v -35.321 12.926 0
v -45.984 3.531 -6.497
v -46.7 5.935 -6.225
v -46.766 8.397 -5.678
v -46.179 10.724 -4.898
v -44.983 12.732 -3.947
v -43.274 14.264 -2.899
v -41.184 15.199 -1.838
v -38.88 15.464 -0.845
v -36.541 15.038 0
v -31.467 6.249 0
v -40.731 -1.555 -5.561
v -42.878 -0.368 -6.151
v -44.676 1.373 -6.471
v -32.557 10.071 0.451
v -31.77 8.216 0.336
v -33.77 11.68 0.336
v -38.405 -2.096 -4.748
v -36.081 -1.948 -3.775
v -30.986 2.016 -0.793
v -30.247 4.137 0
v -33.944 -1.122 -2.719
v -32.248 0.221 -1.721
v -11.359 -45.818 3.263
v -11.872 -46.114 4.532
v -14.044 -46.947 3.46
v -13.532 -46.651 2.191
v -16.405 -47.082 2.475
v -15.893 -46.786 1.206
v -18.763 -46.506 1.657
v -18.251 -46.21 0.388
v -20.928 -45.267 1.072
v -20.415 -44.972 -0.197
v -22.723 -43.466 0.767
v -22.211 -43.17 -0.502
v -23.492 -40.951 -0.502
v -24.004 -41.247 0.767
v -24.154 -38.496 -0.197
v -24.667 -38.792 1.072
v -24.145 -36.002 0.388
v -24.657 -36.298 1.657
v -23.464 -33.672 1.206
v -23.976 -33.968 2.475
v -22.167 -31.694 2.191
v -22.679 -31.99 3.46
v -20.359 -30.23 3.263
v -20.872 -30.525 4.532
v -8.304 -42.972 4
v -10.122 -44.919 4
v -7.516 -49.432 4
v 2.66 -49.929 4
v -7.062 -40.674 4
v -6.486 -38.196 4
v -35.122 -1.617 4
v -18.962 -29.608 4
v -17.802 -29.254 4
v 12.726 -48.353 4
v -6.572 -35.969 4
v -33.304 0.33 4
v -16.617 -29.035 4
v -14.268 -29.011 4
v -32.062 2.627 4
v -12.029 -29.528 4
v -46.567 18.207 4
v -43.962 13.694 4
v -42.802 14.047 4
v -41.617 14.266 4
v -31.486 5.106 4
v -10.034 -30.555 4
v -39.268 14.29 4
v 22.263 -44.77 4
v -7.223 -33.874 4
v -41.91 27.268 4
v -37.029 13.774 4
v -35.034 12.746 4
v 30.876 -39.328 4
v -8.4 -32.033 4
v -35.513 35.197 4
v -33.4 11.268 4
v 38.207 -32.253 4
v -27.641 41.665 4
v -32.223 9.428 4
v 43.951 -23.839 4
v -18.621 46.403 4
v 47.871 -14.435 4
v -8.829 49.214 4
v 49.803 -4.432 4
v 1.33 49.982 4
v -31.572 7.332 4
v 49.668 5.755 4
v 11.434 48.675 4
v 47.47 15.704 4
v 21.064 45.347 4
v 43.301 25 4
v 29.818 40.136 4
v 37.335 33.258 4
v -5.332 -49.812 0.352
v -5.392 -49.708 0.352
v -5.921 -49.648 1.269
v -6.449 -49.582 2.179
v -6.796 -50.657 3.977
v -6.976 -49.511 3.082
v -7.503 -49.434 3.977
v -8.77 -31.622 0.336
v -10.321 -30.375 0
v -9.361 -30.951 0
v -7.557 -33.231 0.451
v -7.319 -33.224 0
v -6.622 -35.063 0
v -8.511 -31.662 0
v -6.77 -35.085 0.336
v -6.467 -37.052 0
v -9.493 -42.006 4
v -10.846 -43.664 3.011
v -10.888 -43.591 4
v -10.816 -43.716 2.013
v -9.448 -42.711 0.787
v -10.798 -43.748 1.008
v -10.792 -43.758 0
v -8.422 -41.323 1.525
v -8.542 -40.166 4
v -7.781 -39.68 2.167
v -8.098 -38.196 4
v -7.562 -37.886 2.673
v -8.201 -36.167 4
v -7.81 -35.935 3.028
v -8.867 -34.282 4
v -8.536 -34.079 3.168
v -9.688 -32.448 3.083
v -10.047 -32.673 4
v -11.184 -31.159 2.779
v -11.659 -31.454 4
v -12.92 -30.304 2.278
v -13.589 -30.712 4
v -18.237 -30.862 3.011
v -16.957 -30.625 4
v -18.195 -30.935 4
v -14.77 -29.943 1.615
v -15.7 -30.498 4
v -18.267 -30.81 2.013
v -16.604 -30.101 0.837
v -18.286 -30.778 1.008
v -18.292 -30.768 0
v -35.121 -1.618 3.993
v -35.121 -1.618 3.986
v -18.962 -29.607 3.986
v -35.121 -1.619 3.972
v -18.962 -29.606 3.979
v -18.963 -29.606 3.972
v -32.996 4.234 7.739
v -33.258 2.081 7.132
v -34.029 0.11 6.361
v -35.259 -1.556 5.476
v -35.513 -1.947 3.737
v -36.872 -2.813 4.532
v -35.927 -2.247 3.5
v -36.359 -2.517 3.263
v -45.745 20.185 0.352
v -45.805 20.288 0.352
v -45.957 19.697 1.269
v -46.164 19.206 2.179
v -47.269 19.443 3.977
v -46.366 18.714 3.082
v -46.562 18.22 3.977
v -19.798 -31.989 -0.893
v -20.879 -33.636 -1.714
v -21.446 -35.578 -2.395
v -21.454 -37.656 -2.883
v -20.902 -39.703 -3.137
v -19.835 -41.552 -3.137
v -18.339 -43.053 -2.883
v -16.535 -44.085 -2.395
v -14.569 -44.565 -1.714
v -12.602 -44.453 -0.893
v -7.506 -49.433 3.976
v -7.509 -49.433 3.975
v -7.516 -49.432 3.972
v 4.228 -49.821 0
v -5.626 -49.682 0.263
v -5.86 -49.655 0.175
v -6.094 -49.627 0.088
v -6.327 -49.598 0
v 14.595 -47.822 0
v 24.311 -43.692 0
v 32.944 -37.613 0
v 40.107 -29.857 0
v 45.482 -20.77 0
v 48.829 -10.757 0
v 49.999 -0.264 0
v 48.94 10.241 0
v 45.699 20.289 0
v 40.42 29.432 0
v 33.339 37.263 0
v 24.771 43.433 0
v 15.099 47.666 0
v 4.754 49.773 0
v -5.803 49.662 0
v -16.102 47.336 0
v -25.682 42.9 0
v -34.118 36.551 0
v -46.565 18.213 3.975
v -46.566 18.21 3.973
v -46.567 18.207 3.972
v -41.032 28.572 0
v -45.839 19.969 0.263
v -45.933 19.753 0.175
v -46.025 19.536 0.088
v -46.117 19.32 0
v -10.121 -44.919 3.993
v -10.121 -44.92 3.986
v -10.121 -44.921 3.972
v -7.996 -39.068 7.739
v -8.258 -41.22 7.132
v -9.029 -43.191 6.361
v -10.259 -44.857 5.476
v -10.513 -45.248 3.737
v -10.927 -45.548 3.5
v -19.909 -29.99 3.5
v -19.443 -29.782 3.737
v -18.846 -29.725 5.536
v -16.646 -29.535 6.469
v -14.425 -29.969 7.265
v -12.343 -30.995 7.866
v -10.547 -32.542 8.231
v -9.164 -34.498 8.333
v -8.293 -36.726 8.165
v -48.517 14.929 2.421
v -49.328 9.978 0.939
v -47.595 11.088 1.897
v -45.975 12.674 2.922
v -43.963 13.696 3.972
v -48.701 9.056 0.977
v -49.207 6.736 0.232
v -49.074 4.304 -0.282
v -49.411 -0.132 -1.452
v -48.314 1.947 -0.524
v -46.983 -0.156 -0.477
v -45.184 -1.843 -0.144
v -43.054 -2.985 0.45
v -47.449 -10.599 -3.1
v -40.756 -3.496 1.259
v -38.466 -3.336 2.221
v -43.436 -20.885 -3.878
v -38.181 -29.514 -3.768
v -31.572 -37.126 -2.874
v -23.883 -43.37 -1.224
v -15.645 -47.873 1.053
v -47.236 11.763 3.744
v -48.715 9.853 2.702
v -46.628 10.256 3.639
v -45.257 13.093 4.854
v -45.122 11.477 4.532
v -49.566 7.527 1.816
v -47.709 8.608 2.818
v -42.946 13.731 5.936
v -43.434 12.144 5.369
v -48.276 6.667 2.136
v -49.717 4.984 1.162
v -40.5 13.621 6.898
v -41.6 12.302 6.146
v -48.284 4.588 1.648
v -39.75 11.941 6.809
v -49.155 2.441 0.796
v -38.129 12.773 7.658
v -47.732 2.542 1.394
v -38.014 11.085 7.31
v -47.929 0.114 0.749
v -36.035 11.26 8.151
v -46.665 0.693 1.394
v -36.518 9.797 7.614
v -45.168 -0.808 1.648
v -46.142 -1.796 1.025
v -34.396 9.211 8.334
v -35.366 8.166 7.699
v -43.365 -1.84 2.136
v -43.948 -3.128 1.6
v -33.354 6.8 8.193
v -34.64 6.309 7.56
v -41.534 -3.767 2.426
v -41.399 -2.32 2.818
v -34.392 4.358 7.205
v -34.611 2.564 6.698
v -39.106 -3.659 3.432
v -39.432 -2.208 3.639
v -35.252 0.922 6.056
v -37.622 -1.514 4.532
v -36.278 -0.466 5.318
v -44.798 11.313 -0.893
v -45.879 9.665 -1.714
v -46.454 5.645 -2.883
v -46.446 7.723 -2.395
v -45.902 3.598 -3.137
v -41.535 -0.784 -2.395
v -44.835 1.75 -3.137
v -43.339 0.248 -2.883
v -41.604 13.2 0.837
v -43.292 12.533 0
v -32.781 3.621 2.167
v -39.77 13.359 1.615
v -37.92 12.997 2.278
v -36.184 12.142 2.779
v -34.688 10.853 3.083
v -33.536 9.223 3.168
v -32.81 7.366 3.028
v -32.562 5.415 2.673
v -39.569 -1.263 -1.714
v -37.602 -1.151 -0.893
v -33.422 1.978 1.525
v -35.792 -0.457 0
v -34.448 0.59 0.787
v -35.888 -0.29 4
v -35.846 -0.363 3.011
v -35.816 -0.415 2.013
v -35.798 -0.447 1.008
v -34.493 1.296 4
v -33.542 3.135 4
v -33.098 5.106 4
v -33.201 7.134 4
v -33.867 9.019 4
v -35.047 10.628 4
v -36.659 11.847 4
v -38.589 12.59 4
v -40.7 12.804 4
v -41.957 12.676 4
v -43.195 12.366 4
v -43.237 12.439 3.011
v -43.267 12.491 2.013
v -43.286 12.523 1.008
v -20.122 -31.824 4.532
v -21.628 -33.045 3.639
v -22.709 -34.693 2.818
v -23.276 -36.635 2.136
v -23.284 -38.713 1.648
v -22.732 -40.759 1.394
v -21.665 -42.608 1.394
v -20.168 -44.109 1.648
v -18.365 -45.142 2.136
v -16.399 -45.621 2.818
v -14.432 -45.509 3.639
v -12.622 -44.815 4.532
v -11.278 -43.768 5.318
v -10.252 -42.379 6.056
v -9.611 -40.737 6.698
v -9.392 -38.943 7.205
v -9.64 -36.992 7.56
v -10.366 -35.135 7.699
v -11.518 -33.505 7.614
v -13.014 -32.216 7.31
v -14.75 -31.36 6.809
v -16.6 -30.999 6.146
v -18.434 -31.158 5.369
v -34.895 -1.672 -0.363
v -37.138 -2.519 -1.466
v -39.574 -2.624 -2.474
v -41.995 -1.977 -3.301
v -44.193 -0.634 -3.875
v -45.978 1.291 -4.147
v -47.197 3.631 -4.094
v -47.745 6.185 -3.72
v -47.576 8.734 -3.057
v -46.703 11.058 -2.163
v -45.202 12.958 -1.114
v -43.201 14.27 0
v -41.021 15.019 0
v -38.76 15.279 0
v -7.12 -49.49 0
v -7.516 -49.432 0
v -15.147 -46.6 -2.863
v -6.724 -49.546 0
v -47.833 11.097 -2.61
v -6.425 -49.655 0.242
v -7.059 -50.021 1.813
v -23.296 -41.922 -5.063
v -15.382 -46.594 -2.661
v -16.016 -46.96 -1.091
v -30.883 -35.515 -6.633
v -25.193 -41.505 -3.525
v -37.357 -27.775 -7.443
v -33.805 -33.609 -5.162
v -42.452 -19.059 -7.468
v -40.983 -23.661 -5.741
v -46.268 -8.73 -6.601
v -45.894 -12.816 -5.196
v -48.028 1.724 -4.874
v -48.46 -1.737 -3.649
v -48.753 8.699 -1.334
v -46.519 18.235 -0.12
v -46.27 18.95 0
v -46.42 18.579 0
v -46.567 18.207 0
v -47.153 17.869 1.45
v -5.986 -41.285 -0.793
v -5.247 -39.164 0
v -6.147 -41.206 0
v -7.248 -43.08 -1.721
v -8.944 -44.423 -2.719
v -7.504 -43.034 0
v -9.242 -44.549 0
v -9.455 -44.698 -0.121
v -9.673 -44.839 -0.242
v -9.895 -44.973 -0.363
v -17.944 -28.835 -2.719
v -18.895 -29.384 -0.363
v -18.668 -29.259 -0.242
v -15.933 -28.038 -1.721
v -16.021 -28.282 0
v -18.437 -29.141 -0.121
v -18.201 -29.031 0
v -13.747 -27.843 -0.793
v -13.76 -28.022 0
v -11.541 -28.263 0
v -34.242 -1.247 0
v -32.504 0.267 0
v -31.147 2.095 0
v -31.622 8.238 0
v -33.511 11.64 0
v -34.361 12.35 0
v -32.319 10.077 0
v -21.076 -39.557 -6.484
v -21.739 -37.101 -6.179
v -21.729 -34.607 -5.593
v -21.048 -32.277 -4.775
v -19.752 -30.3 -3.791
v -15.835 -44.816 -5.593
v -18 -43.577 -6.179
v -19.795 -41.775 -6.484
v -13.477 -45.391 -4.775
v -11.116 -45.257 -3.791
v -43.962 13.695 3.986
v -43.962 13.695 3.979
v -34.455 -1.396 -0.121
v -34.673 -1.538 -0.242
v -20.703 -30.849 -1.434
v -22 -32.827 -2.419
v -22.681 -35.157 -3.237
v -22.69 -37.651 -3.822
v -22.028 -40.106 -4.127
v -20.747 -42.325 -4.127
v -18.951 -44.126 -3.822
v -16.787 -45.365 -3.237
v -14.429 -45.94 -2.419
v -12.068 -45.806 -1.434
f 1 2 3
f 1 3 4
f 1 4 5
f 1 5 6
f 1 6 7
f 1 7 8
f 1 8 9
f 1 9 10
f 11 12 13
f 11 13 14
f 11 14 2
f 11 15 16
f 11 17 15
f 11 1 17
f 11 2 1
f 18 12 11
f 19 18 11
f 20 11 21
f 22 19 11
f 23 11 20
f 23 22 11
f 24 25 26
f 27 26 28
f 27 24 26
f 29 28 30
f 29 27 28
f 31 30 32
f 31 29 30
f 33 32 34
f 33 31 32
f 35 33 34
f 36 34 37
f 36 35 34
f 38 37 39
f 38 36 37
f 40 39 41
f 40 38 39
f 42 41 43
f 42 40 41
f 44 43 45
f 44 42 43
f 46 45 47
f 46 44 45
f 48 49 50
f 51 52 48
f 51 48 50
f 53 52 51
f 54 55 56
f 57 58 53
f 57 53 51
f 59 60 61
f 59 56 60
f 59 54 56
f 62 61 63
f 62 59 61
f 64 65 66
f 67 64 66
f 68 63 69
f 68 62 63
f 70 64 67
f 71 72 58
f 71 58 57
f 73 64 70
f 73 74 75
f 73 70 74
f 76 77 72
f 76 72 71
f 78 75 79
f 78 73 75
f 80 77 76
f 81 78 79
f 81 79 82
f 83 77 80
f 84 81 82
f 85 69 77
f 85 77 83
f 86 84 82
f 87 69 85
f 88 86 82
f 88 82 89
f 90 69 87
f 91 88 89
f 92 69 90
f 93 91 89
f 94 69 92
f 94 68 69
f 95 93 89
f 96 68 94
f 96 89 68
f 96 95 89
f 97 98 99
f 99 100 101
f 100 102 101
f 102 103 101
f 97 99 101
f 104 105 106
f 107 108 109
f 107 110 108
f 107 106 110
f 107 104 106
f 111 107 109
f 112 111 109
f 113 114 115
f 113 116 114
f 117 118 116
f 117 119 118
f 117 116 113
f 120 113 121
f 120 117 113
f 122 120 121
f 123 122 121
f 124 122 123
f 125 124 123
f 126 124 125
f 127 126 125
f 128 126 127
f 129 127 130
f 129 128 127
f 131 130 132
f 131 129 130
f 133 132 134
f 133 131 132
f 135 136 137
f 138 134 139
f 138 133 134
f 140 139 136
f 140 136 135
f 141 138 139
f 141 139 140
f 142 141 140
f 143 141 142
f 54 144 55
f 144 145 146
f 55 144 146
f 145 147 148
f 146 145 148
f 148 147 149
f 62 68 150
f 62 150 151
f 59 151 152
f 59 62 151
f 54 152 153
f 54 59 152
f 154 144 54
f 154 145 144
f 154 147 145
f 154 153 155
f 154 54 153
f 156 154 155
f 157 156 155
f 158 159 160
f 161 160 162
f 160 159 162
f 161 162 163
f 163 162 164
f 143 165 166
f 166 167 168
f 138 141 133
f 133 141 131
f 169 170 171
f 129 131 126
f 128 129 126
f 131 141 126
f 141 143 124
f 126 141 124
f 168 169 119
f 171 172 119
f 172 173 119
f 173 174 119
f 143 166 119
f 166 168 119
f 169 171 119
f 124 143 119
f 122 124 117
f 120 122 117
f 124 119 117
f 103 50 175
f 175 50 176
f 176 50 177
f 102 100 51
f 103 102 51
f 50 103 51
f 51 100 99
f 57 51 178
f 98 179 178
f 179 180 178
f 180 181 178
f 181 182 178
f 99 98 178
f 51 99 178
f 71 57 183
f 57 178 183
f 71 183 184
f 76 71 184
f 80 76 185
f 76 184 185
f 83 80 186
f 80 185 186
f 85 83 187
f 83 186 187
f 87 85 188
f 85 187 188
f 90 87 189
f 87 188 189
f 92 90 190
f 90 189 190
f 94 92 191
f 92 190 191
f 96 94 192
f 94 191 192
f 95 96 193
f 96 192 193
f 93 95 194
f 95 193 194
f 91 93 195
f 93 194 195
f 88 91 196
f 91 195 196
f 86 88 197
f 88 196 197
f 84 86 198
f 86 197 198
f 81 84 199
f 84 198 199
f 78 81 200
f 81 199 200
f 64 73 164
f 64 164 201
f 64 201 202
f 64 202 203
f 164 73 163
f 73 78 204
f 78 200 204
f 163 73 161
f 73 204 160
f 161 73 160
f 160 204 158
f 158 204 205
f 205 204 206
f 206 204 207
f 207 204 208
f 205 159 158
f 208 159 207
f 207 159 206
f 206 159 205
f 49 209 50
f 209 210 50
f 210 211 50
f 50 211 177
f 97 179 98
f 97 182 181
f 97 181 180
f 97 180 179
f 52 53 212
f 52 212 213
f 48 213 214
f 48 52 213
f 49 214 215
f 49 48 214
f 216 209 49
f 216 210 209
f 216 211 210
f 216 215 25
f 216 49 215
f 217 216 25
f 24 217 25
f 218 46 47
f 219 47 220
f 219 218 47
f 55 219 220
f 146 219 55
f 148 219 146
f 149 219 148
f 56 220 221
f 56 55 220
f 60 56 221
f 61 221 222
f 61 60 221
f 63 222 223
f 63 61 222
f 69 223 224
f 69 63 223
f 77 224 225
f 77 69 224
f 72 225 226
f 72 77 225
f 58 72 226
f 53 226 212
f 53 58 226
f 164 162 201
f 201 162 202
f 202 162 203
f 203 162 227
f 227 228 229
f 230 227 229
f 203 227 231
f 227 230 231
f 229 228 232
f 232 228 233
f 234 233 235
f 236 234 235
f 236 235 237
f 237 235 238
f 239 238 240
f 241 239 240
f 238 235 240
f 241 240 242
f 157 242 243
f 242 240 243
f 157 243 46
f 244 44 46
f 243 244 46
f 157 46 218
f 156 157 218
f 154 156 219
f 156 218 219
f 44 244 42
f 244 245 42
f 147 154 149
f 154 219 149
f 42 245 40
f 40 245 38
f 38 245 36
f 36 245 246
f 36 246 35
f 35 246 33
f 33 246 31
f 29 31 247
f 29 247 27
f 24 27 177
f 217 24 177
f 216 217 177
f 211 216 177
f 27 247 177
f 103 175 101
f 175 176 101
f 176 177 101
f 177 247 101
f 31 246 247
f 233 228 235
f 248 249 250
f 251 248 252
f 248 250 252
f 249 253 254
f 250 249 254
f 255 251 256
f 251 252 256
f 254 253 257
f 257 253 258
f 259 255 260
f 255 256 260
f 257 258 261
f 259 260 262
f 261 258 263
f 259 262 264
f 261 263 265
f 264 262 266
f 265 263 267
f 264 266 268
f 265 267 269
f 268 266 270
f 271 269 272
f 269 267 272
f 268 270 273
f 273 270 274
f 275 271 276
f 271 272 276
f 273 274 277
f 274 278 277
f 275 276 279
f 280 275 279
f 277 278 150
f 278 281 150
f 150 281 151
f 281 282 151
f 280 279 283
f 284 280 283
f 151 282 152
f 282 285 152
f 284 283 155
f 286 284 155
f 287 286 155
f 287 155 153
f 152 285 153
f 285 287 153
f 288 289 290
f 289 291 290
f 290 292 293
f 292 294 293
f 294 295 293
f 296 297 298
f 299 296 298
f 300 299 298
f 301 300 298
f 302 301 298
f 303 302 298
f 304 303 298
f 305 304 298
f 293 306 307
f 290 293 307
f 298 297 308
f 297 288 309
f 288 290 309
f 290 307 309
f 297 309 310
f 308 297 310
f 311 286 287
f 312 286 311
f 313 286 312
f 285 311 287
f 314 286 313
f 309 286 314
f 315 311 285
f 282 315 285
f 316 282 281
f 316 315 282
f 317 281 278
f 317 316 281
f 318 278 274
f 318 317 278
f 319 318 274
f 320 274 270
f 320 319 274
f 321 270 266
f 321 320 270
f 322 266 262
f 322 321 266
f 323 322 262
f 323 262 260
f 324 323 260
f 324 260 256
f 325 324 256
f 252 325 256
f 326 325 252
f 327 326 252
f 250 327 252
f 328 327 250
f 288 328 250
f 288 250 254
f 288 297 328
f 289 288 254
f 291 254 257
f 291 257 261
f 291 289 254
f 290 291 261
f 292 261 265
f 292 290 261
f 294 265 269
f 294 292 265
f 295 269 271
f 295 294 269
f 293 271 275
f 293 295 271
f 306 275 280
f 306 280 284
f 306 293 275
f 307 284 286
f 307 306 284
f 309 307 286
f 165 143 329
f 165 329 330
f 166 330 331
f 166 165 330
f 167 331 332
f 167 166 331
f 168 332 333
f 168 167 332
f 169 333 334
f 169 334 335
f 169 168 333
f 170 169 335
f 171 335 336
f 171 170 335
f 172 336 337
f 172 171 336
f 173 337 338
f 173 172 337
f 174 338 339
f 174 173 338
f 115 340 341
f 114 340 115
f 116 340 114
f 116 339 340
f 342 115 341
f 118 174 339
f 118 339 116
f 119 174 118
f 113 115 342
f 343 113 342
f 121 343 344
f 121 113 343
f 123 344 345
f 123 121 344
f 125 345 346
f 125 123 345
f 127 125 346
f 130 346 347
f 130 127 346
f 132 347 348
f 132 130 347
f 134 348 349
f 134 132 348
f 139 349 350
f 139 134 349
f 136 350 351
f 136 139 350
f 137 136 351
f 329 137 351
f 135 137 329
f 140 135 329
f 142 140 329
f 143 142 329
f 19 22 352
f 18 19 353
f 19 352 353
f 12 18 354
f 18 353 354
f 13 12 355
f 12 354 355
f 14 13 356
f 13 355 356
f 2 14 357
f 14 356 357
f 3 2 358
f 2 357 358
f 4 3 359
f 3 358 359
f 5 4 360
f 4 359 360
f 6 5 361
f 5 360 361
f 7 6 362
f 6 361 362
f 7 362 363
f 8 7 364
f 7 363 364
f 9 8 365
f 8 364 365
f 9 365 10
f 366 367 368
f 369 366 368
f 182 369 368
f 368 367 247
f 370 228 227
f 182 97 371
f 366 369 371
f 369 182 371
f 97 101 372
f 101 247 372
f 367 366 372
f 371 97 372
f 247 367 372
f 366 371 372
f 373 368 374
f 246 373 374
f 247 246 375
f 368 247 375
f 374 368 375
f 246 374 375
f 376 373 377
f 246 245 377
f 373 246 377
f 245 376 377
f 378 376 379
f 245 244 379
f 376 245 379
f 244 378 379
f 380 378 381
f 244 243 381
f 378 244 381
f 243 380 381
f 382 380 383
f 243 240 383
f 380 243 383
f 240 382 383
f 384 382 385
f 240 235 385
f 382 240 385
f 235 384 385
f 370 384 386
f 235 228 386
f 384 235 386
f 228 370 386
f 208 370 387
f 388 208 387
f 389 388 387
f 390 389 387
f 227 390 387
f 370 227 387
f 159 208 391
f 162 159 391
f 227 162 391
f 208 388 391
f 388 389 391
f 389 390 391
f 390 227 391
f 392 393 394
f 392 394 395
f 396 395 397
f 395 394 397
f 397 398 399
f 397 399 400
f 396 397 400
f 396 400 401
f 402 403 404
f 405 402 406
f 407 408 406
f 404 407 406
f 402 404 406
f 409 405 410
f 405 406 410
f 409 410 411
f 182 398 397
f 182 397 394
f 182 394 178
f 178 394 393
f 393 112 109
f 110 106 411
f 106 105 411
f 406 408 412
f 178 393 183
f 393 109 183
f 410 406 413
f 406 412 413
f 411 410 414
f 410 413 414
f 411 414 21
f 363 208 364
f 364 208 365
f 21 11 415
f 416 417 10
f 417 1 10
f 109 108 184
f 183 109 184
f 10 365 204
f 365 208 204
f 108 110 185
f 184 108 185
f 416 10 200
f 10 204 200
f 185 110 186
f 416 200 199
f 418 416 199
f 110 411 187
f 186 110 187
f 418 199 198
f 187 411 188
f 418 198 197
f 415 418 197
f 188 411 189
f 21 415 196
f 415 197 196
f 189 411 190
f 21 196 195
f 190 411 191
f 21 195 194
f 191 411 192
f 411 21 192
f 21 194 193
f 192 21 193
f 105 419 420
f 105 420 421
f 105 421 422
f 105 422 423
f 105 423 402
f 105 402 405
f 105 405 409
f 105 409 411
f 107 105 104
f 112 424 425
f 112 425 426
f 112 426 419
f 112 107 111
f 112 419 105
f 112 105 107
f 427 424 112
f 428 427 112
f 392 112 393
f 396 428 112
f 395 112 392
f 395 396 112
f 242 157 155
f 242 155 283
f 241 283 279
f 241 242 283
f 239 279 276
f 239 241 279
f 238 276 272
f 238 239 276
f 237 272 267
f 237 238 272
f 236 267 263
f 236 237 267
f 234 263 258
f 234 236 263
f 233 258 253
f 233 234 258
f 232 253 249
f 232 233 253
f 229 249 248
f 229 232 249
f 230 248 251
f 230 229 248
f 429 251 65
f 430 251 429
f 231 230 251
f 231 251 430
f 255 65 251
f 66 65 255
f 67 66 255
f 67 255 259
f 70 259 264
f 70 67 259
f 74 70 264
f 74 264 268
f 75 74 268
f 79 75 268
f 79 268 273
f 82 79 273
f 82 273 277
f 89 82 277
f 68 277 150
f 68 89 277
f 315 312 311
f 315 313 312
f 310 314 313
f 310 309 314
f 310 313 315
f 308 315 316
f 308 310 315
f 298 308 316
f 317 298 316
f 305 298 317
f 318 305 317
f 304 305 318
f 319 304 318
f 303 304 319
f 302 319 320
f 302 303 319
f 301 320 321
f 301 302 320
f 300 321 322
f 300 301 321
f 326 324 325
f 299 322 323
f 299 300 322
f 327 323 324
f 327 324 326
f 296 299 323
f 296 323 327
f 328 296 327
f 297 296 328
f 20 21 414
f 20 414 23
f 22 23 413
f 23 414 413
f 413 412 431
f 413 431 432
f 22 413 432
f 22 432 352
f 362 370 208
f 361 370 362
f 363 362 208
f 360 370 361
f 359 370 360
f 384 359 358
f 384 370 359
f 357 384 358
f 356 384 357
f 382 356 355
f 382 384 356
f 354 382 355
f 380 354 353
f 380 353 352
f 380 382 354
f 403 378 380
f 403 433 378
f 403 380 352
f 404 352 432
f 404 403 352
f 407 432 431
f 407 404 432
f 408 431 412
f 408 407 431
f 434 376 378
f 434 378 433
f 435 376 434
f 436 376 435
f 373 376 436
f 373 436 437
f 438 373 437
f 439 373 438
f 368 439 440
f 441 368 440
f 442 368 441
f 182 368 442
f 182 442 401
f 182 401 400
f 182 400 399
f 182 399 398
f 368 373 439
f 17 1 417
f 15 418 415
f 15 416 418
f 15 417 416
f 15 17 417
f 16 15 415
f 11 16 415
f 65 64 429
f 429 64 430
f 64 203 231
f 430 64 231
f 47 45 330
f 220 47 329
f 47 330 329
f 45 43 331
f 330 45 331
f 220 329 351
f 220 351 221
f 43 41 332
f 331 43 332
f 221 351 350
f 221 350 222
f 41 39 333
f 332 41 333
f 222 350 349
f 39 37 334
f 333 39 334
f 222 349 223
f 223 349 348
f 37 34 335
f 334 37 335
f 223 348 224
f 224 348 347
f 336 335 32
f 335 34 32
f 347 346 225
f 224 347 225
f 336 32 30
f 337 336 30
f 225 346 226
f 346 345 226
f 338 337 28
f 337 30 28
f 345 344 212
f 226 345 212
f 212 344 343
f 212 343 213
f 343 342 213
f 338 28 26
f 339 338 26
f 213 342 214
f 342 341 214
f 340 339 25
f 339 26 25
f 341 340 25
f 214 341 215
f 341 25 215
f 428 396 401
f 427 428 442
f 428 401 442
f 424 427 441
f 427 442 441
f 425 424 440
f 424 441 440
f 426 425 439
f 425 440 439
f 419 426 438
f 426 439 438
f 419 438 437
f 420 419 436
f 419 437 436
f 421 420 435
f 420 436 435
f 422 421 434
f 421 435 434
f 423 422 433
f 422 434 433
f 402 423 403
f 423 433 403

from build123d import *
from build123d import SkipClean  # not in build123d's __all__

# Parameters (mm, degrees)
F2_DEPTH      = 4
F4_DEPTH      = 5
F5_DEPTH      = 45.5098150694
F5_DEPTH_BACK = 23.1317451549
F6_DEPTH      = 3
F9_DEPTH      = 4


with BuildPart() as f2:
    # F0 (on Top) → F2 (new body)
    with BuildSketch(Plane.XY):
        with BuildLine():
            Line((27.041634566, -15.612494996), (39.541634566, 6.0381400986))
            ThreePointArc((39.541634566, 6.0381400986), (34.6410161514, 20), (25, 31.224989992))
            Line((25, 31.224989992), (0, 31.224989992))
            Line((0, 31.224989992), (0, 0))
            Line((0, 0), (27.041634566, -15.612494996))
        make_face()
        with BuildLine():
            ThreePointArc((-14.541634566, -37.2631300906), (0, -40), (14.541634566, -37.2631300906))
            Line((14.541634566, -37.2631300906), (27.041634566, -15.612494996))
            Line((27.041634566, -15.612494996), (0, 0))
            Line((0, 0), (-27.041634566, -15.612494996))
            Line((-27.041634566, -15.612494996), (-14.541634566, -37.2631300906))
        make_face()
        with BuildLine():
            Line((0, 31.224989992), (-25, 31.224989992))
            ThreePointArc((-25, 31.224989992), (-34.6410161514, 20), (-39.541634566, 6.0381400986))
            Line((-39.541634566, 6.0381400986), (-27.041634566, -15.612494996))
            Line((-27.041634566, -15.612494996), (0, 0))
            Line((0, 0), (0, 31.224989992))
        make_face()
        with BuildLine():
            ThreePointArc((14.541634566, -37.2631300906), (33.0277563773, -22.5647359541), (40, 0))
            ThreePointArc((40, 0), (39.8852440298, 3.0277563773), (39.541634566, 6.0381400986))
            Line((39.541634566, 6.0381400986), (27.041634566, -15.612494996))
            Line((27.041634566, -15.612494996), (14.541634566, -37.2631300906))
        make_face()
        with BuildLine():
            Line((0, 31.224989992), (25, 31.224989992))
            ThreePointArc((25, 31.224989992), (0, 40), (-25, 31.224989992))
            Line((-25, 31.224989992), (0, 31.224989992))
        make_face()
        with BuildLine():
            ThreePointArc((39.541634566, 6.0381400986), (39.8852440298, 3.0277563773), (40, 0))
            ThreePointArc((40, 0), (33.0277563773, -22.5647359541), (14.541634566, -37.2631300906))
            ThreePointArc((14.541634566, -37.2631300906), (0, -40), (-14.541634566, -37.2631300906))
            Line((-14.541634566, -37.2631300906), (-7.5160103762, -49.4318681422))
            ThreePointArc((-7.5160103762, -49.4318681422), (32.5898717487, -37.9196553176), (50, 0))
            ThreePointArc((50, 0), (9.2638291816, 49.1343206821), (-46.5672587557, 18.2068781502))
            Line((-46.5672587557, 18.2068781502), (-39.541634566, 6.0381400986))
            ThreePointArc((-39.541634566, 6.0381400986), (-34.6410161514, 20), (-25, 31.224989992))
            ThreePointArc((-25, 31.224989992), (0, 40), (25, 31.224989992))
            ThreePointArc((25, 31.224989992), (34.6410161514, 20), (39.541634566, 6.0381400986))
        make_face()
    extrude(amount=F2_DEPTH)

    # F3 (on line) → F4 (join)
    with BuildSketch(Plane(origin=(-4.8298034606, -2.7884883281, 11.9598650349), x_dir=(0.9306155778, -0.0831049393, 0.3564382351), z_dir=(0.3659981508, 0.2113091309, -0.906307787))):
        with BuildLine():
            ThreePointArc((-41.3294511967, -12.2059585244), (-43.6253957362, -1.8508323218), (-33.2702695336, 0.4451122176))
            Line((-33.2702695336, 0.4451122176), (-32.4643513672, 1.7102192918))
            ThreePointArc((-32.4643513672, 1.7102192918), (-44.8905028104, -1.0449141555), (-42.135369363, -13.4710655987))
            Line((-42.135369363, -13.4710655986), (-41.3294511967, -12.2059585244))
        make_face()
        with BuildLine():
            Line((-32.4643513672, 1.7102192918), (-33.2702695336, 0.4451122176))
            ThreePointArc((-33.2702695336, 0.4451122176), (-30.724454247, -2.2729261844), (-29.7998603651, -5.8804231534))
            ThreePointArc((-29.7998603651, -5.8804231534), (-33.6923633961, -12.4558292716), (-41.3294511967, -12.2059585244))
            Line((-41.3294511967, -12.2059585244), (-42.135369363, -13.4710655986))
            ThreePointArc((-42.135369363, -13.4710655987), (-32.9708640023, -13.7709104952), (-28.2998603651, -5.8804231534))
            ThreePointArc((-28.2998603651, -5.8804231534), (-29.4093730234, -1.5514267906), (-32.4643513672, 1.7102192918))
        make_face()
        with BuildLine():
            ThreePointArc((-5.6004124901, 43.8804550986), (-18.0265639332, 41.1253216513), (-15.2714304859, 28.6991702082))
            Line((-15.2714304859, 28.6991702082), (-14.4655123195, 29.9642772824))
            ThreePointArc((-14.4655123195, 29.9642772824), (-16.761456859, 40.319403485), (-6.4063306564, 42.6153480244))
            Line((-6.4063306564, 42.6153480244), (-5.6004124901, 43.8804550986))
        make_face()
        with BuildLine():
            Line((-14.4655123195, 29.9642772824), (-15.2714304859, 28.6991702082))
            ThreePointArc((-15.2714304859, 28.6991702082), (-6.1069251251, 28.3993253116), (-1.435921488, 36.2898126534))
            ThreePointArc((-1.435921488, 36.2898126534), (-2.5454341462, 40.6188090162), (-5.6004124901, 43.8804550986))
            Line((-5.6004124901, 43.8804550986), (-6.4063306564, 42.6153480244))
            ThreePointArc((-6.4063306564, 42.6153480244), (-3.8605153698, 39.8973096224), (-2.935921488, 36.2898126534))
            ThreePointArc((-2.935921488, 36.2898126534), (-6.8284245189, 29.7144065353), (-14.4655123195, 29.9642772824))
        make_face()
    extrude(amount=-F4_DEPTH)

    # F3 (on line) → F5 (cut, two sides)
    with BuildSketch(Plane(origin=(-4.8298034606, -2.7884883281, 11.9598650349), x_dir=(0.9306155778, -0.0831049393, 0.3564382351), z_dir=(0.3659981508, 0.2113091309, -0.906307787))) as f5_sk:
        with BuildLine():
            Line((-41.3294511967, -12.2059585244), (-37.2998603651, -5.8804231534))
            Line((-37.2998603651, -5.8804231534), (-33.2702695336, 0.4451122176))
            ThreePointArc((-33.2702695336, 0.4451122176), (-43.6253957362, -1.8508323218), (-41.3294511967, -12.2059585244))
        make_face()
        with BuildLine():
            Line((-33.2702695336, 0.4451122176), (-37.2998603651, -5.8804231534))
            Line((-37.2998603651, -5.8804231534), (-41.3294511967, -12.2059585244))
            ThreePointArc((-41.3294511967, -12.2059585244), (-33.6923633961, -12.4558292716), (-29.7998603651, -5.8804231534))
            ThreePointArc((-29.7998603651, -5.8804231534), (-30.724454247, -2.2729261844), (-33.2702695336, 0.4451122176))
        make_face()
        with BuildLine():
            ThreePointArc((-6.4063306564, 42.6153480244), (-16.761456859, 40.319403485), (-14.4655123195, 29.9642772824))
            Line((-14.4655123195, 29.9642772824), (-10.435921488, 36.2898126534))
            Line((-10.435921488, 36.2898126534), (-6.4063306564, 42.6153480244))
        make_face()
        with BuildLine():
            Line((-10.435921488, 36.2898126534), (-14.4655123195, 29.9642772824))
            ThreePointArc((-14.4655123195, 29.9642772824), (-6.8284245189, 29.7144065353), (-2.935921488, 36.2898126534))
            ThreePointArc((-2.935921488, 36.2898126534), (-3.8605153698, 39.8973096224), (-6.4063306564, 42.6153480244))
            Line((-6.4063306564, 42.6153480244), (-10.435921488, 36.2898126534))
        make_face()
    with SkipClean():  # cleaning this boolean's faces spoils the solid; the shape is the same uncleaned
        extrude(amount=F5_DEPTH, mode=Mode.SUBTRACT)
        extrude(f5_sk.sketch, amount=-F5_DEPTH_BACK, mode=Mode.SUBTRACT)

    # F3 (on line) → F6 (join)
    with BuildSketch(Plane(origin=(-4.8298034606, -2.7884883281, 11.9598650349), x_dir=(0.9306155778, -0.0831049393, 0.3564382351), z_dir=(0.3659981508, 0.2113091309, -0.906307787))):
        with BuildLine():
            ThreePointArc((-41.3294511967, -12.2059585244), (-43.6253957362, -1.8508323218), (-33.2702695336, 0.4451122176))
            Line((-33.2702695336, 0.4451122176), (-32.4643513672, 1.7102192918))
            ThreePointArc((-32.4643513672, 1.7102192918), (-44.8905028104, -1.0449141555), (-42.135369363, -13.4710655987))
            Line((-42.135369363, -13.4710655986), (-41.3294511967, -12.2059585244))
        make_face()
        with BuildLine():
            Line((-32.4643513672, 1.7102192918), (-33.2702695336, 0.4451122176))
            ThreePointArc((-33.2702695336, 0.4451122176), (-30.724454247, -2.2729261844), (-29.7998603651, -5.8804231534))
            ThreePointArc((-29.7998603651, -5.8804231534), (-33.6923633961, -12.4558292716), (-41.3294511967, -12.2059585244))
            Line((-41.3294511967, -12.2059585244), (-42.135369363, -13.4710655986))
            ThreePointArc((-42.135369363, -13.4710655987), (-32.9708640023, -13.7709104952), (-28.2998603651, -5.8804231534))
            ThreePointArc((-28.2998603651, -5.8804231534), (-29.4093730234, -1.5514267906), (-32.4643513672, 1.7102192918))
        make_face()
        with BuildLine():
            Line((-41.3294511967, -12.2059585244), (-37.2998603651, -5.8804231534))
            Line((-37.2998603651, -5.8804231534), (-33.2702695336, 0.4451122176))
            ThreePointArc((-33.2702695336, 0.4451122176), (-43.6253957362, -1.8508323218), (-41.3294511967, -12.2059585244))
        make_face()
        with BuildLine():
            Line((-33.2702695336, 0.4451122176), (-37.2998603651, -5.8804231534))
            Line((-37.2998603651, -5.8804231534), (-41.3294511967, -12.2059585244))
            ThreePointArc((-41.3294511967, -12.2059585244), (-33.6923633961, -12.4558292716), (-29.7998603651, -5.8804231534))
            ThreePointArc((-29.7998603651, -5.8804231534), (-30.724454247, -2.2729261844), (-33.2702695336, 0.4451122176))
        make_face()
        with BuildLine():
            ThreePointArc((-5.6004124901, 43.8804550986), (-18.0265639332, 41.1253216513), (-15.2714304859, 28.6991702082))
            Line((-15.2714304859, 28.6991702082), (-14.4655123195, 29.9642772824))
            ThreePointArc((-14.4655123195, 29.9642772824), (-16.761456859, 40.319403485), (-6.4063306564, 42.6153480244))
            Line((-6.4063306564, 42.6153480244), (-5.6004124901, 43.8804550986))
        make_face()
        with BuildLine():
            Line((-14.4655123195, 29.9642772824), (-15.2714304859, 28.6991702082))
            ThreePointArc((-15.2714304859, 28.6991702082), (-6.1069251251, 28.3993253116), (-1.435921488, 36.2898126534))
            ThreePointArc((-1.435921488, 36.2898126534), (-2.5454341462, 40.6188090162), (-5.6004124901, 43.8804550986))
            Line((-5.6004124901, 43.8804550986), (-6.4063306564, 42.6153480244))
            ThreePointArc((-6.4063306564, 42.6153480244), (-3.8605153698, 39.8973096224), (-2.935921488, 36.2898126534))
            ThreePointArc((-2.935921488, 36.2898126534), (-6.8284245189, 29.7144065353), (-14.4655123195, 29.9642772824))
        make_face()
        with BuildLine():
            ThreePointArc((-6.4063306564, 42.6153480244), (-16.761456859, 40.319403485), (-14.4655123195, 29.9642772824))
            Line((-14.4655123195, 29.9642772824), (-10.435921488, 36.2898126534))
            Line((-10.435921488, 36.2898126534), (-6.4063306564, 42.6153480244))
        make_face()
        with BuildLine():
            Line((-10.435921488, 36.2898126534), (-14.4655123195, 29.9642772824))
            ThreePointArc((-14.4655123195, 29.9642772824), (-6.8284245189, 29.7144065353), (-2.935921488, 36.2898126534))
            ThreePointArc((-2.935921488, 36.2898126534), (-3.8605153698, 39.8973096224), (-6.4063306564, 42.6153480244))
            Line((-6.4063306564, 42.6153480244), (-10.435921488, 36.2898126534))
        make_face()
    with SkipClean():  # cleaning this boolean's faces spoils the solid; the shape is the same uncleaned
        extrude(amount=F6_DEPTH)

    # F8 (on offset) → F9 (join)
    with BuildSketch(Plane(origin=(-6.1473968034, -3.5492011993, 15.2225730682), x_dir=(0.9306155778, -0.0831049393, 0.3564382351), z_dir=(0.3659981508, 0.2113091309, -0.906307787))):
        with BuildLine():
            ThreePointArc((-40.62355156, -14.2442187536), (-44.8905028104, -1.0449141555), (-31.1246632897, 0.6668618625))
            Line((-31.1246632897, 0.6668618625), (-13.7596126828, 27.9260170532))
            ThreePointArc((-13.7596126828, 27.9260170532), (-18.0265639332, 41.1253216513), (-4.2607244125, 42.8370976693))
            Line((-4.2607244125, 42.8370976693), (-1.4607309953, 47.2324465122))
            Line((-1.4607309953, 47.2324465122), (-0.697246957, 48.4309417171))
            add(Edge.make_bspline(
                [(-0.697246957, 48.4309417171), (-65.0877492303, 41.4632093827), (-44.1870290155, -19.8380628014)],
                knots=[3.7691820168, 3.7691820168, 3.7691820168, 5.655595944, 5.655595944, 5.655595944], degree=2, weights=[1, 0.5871951872, 1]))
            Line((-44.1870290155, -19.8380628014), (-40.62355156, -14.2442187536))
        make_face()
    extrude(amount=F9_DEPTH)


solid = f2.part
